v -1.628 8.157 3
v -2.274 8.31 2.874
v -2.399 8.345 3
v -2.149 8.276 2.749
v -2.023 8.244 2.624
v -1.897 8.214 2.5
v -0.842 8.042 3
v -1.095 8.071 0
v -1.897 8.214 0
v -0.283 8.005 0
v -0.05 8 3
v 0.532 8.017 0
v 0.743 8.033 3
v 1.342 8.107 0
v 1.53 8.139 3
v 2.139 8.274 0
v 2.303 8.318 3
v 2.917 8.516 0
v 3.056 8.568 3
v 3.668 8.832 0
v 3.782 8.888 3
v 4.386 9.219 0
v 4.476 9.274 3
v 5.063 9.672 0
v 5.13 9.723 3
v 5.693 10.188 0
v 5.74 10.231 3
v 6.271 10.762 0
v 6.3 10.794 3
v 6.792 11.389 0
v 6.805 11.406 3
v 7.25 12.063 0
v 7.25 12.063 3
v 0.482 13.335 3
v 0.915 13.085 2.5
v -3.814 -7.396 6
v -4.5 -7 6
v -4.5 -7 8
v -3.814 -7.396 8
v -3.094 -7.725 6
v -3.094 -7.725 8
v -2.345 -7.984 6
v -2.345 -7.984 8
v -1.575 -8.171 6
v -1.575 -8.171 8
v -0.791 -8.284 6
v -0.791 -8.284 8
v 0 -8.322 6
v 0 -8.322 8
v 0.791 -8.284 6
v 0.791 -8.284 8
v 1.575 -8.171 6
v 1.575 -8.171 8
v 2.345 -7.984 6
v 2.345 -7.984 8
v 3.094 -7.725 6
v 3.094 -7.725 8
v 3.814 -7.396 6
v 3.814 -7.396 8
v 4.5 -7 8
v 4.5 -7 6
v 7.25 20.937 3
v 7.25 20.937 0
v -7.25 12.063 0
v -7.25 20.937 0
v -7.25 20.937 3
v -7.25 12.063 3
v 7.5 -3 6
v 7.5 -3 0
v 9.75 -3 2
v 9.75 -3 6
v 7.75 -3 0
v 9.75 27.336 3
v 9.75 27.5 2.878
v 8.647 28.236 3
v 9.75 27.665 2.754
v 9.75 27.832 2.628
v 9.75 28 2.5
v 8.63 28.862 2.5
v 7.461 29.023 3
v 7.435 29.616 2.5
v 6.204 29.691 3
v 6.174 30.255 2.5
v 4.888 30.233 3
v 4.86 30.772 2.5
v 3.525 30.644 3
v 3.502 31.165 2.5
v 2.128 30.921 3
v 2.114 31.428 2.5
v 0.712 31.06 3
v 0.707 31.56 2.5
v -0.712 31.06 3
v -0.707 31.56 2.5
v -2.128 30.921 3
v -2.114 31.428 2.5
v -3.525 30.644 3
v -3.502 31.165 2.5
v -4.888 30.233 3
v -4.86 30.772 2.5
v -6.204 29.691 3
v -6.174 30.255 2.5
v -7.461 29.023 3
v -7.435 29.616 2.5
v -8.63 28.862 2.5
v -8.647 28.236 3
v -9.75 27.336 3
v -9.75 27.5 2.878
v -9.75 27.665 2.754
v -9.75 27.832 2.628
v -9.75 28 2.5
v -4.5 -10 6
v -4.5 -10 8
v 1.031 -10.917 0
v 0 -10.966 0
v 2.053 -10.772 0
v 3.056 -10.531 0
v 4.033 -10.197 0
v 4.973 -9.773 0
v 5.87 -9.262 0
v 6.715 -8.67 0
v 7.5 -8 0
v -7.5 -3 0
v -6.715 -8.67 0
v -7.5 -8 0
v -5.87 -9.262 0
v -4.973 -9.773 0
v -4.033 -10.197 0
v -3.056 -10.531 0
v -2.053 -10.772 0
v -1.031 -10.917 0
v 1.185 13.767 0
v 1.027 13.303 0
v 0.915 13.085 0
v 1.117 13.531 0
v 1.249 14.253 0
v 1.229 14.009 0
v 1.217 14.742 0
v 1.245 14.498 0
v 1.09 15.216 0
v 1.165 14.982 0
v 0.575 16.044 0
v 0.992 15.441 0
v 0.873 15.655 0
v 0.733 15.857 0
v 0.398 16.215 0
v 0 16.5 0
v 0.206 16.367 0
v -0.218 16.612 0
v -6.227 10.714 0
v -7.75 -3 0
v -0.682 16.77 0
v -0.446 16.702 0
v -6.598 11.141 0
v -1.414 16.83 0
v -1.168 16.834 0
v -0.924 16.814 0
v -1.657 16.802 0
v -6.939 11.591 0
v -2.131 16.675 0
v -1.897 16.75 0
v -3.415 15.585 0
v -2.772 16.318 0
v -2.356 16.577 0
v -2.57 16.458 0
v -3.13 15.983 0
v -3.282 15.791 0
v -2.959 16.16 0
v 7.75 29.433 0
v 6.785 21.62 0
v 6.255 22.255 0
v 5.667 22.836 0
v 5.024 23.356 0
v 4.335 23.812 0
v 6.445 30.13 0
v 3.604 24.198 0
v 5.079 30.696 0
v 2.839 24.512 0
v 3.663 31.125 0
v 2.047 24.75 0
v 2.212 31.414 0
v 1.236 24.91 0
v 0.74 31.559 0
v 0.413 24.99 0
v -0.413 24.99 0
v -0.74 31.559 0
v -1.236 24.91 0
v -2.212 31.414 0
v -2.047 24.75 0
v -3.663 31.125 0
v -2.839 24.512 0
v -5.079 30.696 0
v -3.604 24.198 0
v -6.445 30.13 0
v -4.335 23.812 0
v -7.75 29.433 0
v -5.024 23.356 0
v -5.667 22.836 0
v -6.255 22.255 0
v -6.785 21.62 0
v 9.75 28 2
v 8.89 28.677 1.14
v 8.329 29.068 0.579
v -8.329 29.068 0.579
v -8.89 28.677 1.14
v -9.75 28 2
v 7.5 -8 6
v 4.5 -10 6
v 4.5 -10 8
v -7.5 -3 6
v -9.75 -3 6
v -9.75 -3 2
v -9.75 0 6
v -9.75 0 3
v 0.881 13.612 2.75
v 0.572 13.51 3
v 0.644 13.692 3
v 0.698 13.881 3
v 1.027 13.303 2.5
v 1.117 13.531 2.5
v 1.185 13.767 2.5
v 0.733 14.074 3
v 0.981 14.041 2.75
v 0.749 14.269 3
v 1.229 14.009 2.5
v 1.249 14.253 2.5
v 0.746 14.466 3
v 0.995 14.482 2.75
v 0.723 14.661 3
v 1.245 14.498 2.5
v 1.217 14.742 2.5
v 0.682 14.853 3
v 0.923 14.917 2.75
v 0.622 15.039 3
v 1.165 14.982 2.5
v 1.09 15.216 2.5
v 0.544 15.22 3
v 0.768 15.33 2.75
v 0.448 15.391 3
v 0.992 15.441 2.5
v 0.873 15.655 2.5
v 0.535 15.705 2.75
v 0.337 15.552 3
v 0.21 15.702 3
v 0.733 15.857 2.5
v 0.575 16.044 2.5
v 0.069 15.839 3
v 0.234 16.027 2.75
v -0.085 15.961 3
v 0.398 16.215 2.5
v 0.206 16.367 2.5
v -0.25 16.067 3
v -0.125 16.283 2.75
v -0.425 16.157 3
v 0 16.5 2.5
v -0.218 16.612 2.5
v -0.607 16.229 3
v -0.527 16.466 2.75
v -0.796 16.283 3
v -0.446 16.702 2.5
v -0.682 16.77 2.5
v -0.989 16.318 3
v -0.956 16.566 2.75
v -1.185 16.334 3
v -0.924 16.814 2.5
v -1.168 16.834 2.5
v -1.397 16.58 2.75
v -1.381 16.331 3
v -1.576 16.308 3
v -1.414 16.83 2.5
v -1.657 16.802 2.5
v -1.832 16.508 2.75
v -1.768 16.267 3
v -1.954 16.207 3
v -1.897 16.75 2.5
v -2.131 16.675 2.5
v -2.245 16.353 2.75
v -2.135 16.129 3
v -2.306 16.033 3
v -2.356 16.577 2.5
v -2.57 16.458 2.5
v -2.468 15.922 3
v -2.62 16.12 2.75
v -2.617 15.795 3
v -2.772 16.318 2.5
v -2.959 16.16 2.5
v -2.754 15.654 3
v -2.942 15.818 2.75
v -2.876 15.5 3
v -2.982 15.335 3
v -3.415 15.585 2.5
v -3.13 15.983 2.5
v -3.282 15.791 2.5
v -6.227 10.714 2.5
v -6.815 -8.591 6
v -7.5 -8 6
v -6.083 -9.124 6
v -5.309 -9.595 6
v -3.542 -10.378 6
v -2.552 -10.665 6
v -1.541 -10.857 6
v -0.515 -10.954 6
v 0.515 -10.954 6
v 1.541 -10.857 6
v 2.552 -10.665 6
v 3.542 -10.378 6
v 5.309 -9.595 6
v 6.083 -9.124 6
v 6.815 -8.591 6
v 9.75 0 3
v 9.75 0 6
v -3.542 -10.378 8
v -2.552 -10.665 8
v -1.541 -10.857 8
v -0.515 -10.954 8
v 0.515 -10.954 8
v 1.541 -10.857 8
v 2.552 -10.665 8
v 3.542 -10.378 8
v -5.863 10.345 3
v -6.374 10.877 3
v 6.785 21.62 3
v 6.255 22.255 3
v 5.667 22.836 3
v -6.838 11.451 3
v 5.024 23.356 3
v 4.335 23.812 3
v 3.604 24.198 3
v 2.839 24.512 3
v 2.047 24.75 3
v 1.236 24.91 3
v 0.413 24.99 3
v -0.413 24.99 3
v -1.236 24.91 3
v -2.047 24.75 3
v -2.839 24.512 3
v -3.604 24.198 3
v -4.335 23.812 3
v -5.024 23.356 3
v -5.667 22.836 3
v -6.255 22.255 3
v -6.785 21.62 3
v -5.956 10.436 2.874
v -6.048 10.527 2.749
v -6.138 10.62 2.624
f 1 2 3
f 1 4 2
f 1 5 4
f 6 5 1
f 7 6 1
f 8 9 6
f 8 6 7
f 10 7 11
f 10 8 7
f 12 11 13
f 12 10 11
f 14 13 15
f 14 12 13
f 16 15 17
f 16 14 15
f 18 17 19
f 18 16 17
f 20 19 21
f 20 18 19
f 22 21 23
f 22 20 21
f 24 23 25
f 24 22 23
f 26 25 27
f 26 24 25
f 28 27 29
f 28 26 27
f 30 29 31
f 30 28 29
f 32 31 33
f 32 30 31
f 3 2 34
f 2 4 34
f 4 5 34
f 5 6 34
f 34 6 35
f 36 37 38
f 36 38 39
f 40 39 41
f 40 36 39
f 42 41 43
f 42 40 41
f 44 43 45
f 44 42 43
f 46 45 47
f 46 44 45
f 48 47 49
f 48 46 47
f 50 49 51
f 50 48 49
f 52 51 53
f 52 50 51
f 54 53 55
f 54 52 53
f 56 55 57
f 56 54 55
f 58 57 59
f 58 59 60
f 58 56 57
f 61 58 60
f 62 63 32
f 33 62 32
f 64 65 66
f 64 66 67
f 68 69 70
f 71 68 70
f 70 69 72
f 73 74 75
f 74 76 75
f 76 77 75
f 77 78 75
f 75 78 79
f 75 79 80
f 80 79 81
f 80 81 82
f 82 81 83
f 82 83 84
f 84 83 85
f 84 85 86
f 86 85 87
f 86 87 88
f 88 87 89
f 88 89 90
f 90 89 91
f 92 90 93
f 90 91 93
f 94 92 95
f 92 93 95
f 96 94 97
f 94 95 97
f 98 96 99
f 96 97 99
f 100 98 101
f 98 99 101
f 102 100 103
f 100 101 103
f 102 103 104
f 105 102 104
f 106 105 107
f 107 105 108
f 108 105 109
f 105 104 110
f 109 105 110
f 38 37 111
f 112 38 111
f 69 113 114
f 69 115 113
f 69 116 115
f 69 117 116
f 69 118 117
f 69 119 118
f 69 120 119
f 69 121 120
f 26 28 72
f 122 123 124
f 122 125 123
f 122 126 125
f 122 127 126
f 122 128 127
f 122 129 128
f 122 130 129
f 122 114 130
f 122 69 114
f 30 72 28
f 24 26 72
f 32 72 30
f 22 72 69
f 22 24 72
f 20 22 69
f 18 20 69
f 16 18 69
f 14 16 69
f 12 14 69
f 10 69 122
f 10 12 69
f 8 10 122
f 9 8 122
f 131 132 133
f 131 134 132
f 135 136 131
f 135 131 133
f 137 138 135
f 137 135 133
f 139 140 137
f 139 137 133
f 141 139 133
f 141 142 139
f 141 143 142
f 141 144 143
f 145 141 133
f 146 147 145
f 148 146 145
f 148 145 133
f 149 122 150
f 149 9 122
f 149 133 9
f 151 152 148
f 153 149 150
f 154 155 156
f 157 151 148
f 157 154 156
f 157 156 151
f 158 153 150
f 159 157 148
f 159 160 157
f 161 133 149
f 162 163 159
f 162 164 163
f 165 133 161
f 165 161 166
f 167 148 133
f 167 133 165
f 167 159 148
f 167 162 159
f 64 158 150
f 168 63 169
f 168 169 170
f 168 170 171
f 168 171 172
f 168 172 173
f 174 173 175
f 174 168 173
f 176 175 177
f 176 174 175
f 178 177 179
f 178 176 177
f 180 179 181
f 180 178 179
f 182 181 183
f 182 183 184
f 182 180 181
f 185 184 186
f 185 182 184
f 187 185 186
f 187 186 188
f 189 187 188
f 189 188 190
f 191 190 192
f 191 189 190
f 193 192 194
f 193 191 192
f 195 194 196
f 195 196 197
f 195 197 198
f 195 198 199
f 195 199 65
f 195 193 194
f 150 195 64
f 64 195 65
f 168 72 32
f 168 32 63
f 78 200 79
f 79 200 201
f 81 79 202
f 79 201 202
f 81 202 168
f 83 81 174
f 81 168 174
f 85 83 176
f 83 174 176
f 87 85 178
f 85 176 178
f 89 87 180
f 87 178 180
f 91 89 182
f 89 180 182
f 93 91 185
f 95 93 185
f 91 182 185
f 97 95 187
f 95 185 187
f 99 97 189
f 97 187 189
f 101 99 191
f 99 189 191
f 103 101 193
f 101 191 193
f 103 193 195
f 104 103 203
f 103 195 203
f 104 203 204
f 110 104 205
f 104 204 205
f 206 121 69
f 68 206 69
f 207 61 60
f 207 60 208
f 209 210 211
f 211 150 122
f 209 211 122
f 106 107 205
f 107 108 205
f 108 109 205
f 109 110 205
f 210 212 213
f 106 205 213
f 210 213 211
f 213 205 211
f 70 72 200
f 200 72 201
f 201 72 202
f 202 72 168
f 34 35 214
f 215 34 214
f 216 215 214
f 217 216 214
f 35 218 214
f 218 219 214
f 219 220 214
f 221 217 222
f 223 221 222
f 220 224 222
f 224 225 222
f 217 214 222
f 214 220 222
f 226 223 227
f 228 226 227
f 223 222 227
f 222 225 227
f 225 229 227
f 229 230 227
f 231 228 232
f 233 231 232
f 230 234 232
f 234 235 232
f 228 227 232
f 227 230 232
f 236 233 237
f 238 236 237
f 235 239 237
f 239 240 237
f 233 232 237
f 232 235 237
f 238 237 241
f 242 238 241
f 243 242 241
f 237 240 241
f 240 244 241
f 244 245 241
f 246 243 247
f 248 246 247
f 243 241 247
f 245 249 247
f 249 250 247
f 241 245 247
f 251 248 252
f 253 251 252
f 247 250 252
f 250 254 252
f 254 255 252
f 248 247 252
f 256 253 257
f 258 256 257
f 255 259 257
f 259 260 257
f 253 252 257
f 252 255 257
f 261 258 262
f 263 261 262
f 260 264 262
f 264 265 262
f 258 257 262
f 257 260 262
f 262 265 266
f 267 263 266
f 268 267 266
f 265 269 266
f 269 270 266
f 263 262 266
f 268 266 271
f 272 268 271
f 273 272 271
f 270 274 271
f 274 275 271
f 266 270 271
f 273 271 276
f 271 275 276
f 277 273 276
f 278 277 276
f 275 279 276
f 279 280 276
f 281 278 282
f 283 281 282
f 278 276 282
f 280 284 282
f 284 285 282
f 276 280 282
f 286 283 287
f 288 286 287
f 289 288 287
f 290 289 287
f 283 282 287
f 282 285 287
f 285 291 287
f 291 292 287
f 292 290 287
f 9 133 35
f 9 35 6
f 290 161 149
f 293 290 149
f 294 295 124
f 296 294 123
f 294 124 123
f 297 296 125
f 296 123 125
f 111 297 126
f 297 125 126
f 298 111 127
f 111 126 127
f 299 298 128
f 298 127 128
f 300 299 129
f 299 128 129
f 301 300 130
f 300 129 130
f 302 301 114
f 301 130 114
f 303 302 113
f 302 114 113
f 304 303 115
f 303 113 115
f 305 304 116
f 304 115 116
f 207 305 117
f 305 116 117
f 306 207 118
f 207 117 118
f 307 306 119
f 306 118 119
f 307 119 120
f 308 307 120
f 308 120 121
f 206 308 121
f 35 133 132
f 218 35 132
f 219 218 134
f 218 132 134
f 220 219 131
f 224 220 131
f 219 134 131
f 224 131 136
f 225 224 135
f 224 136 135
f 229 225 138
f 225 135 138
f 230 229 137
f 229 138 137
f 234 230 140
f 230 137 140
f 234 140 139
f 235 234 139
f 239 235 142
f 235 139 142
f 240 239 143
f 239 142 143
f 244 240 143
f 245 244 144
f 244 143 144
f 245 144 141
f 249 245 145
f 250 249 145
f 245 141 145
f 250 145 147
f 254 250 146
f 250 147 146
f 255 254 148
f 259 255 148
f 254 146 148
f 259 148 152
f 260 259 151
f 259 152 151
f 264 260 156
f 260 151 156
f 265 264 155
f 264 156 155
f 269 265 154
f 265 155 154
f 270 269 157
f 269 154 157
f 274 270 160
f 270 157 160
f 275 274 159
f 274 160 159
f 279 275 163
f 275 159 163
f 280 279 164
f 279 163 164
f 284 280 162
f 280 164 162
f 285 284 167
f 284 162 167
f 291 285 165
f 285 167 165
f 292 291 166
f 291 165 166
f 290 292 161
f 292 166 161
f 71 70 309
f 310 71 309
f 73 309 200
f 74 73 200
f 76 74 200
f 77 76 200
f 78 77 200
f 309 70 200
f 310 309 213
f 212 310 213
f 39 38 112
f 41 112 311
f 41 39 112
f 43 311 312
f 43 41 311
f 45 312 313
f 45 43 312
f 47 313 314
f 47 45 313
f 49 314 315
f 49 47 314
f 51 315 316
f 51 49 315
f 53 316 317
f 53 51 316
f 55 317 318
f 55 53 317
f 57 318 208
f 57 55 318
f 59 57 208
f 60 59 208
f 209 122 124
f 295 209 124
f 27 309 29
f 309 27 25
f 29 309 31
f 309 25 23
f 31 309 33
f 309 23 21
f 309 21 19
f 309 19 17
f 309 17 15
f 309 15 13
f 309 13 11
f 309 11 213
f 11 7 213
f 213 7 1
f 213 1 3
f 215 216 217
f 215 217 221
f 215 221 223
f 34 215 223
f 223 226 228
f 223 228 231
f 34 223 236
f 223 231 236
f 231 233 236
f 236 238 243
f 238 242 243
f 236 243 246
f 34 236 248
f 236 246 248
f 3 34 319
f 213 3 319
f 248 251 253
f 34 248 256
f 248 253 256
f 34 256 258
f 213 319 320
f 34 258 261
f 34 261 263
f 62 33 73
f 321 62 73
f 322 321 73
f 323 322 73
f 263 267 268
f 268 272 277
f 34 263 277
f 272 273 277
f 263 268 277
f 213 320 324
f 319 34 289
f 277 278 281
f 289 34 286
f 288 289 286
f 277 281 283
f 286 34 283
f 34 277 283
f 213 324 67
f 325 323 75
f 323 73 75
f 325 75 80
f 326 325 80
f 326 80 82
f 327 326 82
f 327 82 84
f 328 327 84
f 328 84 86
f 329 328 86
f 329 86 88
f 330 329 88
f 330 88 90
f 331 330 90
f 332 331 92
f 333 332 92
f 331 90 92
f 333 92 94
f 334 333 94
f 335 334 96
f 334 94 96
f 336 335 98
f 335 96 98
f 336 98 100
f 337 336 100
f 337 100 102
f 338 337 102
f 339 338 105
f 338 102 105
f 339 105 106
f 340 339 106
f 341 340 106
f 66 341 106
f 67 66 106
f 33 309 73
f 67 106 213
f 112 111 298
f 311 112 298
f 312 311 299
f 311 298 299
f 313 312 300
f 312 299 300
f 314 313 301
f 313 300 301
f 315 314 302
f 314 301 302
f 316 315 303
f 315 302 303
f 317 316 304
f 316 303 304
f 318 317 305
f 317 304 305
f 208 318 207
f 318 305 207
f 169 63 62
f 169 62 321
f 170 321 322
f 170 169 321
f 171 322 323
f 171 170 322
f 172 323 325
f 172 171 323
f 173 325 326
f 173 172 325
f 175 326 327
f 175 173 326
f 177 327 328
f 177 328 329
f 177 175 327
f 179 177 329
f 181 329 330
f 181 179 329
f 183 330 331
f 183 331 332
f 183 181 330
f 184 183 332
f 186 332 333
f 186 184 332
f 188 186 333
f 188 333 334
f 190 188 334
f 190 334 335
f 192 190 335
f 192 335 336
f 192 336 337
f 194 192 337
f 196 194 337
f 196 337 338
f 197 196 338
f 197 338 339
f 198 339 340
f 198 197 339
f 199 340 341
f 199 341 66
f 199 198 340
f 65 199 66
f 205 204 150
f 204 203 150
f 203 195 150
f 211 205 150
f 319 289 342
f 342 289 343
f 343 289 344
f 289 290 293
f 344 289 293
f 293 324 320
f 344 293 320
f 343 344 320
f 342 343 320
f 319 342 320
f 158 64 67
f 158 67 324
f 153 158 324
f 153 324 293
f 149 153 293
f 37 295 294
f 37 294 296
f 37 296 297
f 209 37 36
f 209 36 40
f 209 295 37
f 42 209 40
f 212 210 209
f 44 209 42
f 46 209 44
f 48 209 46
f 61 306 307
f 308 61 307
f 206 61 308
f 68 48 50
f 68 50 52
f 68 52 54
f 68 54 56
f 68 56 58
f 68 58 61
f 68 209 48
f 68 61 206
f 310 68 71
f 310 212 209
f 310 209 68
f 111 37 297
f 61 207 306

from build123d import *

# Parameters (mm, degrees)
EXTRUDE002_DEPTH = 2
EXTRUDE_DEPTH    = 3
CHAMFER_SIZE     = 2
CHAMFER001_SIZE  = 0.5
EXTRUDE001_DEPTH = 3


with BuildPart() as extrude002:
    # Sketch002 (on Face10 of Extrude001) → Extrude002 (new body)
    with BuildSketch(Plane.XY.offset(6)):
        with BuildLine():
            ThreePointArc((-4.5, -10), (0, -10.965856), (4.5, -10))
            Line((4.5, -7), (4.5, -10))
            ThreePointArc((-4.5, -7), (0, -8.321658), (4.5, -7))
            Line((-4.5, -7), (-4.5, -10))
        make_face()
    extrude(amount=EXTRUDE002_DEPTH)


with BuildPart() as chamfer001:
    # Sketch → Extrude (new body)
    with BuildSketch(Plane.XY):
        with BuildLine():
            Line((9.75, 28), (9.75, 0))
            Line((9.75, -3), (9.75, 0))
            Line((7.5, -3), (9.75, -3))
            Line((7.5, -8), (7.5, -3))
            ThreePointArc((-7.5, -8), (0, -10.965856), (7.5, -8))
            Line((-7.5, -3), (-7.5, -8))
            Line((-9.75, -3), (-7.5, -3))
            Line((-9.75, 0), (-9.75, -3))
            Line((-9.75, 0), (-9.75, 28))
            ThreePointArc((9.75, 28), (0, 31.576886), (-9.75, 28))
        make_face()
        with BuildLine():
            ThreePointArc((7.25, 20.93706), (0, 25), (-7.25, 20.93706))
            Line((-7.25, 20.93706), (-7.25, 12.06294))
            ThreePointArc((-7.25, 12.06294), (-6.772193, 11.363133), (-6.227082, 10.714376))
            Line((-3.415063, 15.584937), (-6.227082, 10.714376))
            ThreePointArc((0.915063, 13.084936), (0, 16.5), (-3.415063, 15.584937))
            Line((0.915063, 13.084936), (-1.896956, 8.214376))
            ThreePointArc((-1.896956, 8.214376), (3.296457, 8.665246), (7.25, 12.06294))
            Line((7.25, 20.93706), (7.25, 12.06294))
        make_face(mode=Mode.SUBTRACT)
    extrude(amount=EXTRUDE_DEPTH)

    # Chamfer
    chamfer_edges = [chamfer001.edges().sort_by_distance(p)[0] for p in [
        (-9.75, 14, 0),
        (9.75, 14, 0),
        (9.75, -1.5, 0),
        (-9.75, -1.5, 0),
    ]]
    chamfer(chamfer_edges, length=CHAMFER_SIZE)

    # Chamfer001
    chamfer001_edges = [chamfer001.edges().sort_by_distance(p)[0] for p in [
        (0, 31.576886, 3),
        (-4.821073, 13.149656, 3),
    ]]
    chamfer(chamfer001_edges, length=CHAMFER001_SIZE)


with BuildPart() as fusion:
    # Sketch001 (on Face4 of Chamfer) → Extrude001 (new body)
    with BuildSketch(Plane.XY.offset(3)):
        with BuildLine():
            Line((9.75, 0), (-9.75, 0))
            Line((-9.75, 0), (-9.75, -3))
            Line((-9.75, -3), (-7.5, -3))
            Line((-7.5, -3), (-7.5, -8))
            ThreePointArc((-7.5, -8), (0, -10.965856), (7.5, -8))
            Line((7.5, -3), (7.5, -8))
            Line((9.75, -3), (7.5, -3))
            Line((9.75, 0), (9.75, -3))
        make_face()
    extrude(amount=EXTRUDE001_DEPTH)

    # Fusion: union Extrude002, Chamfer001
    add(extrude002.part)
    add(chamfer001.part)


solid = fusion.part
